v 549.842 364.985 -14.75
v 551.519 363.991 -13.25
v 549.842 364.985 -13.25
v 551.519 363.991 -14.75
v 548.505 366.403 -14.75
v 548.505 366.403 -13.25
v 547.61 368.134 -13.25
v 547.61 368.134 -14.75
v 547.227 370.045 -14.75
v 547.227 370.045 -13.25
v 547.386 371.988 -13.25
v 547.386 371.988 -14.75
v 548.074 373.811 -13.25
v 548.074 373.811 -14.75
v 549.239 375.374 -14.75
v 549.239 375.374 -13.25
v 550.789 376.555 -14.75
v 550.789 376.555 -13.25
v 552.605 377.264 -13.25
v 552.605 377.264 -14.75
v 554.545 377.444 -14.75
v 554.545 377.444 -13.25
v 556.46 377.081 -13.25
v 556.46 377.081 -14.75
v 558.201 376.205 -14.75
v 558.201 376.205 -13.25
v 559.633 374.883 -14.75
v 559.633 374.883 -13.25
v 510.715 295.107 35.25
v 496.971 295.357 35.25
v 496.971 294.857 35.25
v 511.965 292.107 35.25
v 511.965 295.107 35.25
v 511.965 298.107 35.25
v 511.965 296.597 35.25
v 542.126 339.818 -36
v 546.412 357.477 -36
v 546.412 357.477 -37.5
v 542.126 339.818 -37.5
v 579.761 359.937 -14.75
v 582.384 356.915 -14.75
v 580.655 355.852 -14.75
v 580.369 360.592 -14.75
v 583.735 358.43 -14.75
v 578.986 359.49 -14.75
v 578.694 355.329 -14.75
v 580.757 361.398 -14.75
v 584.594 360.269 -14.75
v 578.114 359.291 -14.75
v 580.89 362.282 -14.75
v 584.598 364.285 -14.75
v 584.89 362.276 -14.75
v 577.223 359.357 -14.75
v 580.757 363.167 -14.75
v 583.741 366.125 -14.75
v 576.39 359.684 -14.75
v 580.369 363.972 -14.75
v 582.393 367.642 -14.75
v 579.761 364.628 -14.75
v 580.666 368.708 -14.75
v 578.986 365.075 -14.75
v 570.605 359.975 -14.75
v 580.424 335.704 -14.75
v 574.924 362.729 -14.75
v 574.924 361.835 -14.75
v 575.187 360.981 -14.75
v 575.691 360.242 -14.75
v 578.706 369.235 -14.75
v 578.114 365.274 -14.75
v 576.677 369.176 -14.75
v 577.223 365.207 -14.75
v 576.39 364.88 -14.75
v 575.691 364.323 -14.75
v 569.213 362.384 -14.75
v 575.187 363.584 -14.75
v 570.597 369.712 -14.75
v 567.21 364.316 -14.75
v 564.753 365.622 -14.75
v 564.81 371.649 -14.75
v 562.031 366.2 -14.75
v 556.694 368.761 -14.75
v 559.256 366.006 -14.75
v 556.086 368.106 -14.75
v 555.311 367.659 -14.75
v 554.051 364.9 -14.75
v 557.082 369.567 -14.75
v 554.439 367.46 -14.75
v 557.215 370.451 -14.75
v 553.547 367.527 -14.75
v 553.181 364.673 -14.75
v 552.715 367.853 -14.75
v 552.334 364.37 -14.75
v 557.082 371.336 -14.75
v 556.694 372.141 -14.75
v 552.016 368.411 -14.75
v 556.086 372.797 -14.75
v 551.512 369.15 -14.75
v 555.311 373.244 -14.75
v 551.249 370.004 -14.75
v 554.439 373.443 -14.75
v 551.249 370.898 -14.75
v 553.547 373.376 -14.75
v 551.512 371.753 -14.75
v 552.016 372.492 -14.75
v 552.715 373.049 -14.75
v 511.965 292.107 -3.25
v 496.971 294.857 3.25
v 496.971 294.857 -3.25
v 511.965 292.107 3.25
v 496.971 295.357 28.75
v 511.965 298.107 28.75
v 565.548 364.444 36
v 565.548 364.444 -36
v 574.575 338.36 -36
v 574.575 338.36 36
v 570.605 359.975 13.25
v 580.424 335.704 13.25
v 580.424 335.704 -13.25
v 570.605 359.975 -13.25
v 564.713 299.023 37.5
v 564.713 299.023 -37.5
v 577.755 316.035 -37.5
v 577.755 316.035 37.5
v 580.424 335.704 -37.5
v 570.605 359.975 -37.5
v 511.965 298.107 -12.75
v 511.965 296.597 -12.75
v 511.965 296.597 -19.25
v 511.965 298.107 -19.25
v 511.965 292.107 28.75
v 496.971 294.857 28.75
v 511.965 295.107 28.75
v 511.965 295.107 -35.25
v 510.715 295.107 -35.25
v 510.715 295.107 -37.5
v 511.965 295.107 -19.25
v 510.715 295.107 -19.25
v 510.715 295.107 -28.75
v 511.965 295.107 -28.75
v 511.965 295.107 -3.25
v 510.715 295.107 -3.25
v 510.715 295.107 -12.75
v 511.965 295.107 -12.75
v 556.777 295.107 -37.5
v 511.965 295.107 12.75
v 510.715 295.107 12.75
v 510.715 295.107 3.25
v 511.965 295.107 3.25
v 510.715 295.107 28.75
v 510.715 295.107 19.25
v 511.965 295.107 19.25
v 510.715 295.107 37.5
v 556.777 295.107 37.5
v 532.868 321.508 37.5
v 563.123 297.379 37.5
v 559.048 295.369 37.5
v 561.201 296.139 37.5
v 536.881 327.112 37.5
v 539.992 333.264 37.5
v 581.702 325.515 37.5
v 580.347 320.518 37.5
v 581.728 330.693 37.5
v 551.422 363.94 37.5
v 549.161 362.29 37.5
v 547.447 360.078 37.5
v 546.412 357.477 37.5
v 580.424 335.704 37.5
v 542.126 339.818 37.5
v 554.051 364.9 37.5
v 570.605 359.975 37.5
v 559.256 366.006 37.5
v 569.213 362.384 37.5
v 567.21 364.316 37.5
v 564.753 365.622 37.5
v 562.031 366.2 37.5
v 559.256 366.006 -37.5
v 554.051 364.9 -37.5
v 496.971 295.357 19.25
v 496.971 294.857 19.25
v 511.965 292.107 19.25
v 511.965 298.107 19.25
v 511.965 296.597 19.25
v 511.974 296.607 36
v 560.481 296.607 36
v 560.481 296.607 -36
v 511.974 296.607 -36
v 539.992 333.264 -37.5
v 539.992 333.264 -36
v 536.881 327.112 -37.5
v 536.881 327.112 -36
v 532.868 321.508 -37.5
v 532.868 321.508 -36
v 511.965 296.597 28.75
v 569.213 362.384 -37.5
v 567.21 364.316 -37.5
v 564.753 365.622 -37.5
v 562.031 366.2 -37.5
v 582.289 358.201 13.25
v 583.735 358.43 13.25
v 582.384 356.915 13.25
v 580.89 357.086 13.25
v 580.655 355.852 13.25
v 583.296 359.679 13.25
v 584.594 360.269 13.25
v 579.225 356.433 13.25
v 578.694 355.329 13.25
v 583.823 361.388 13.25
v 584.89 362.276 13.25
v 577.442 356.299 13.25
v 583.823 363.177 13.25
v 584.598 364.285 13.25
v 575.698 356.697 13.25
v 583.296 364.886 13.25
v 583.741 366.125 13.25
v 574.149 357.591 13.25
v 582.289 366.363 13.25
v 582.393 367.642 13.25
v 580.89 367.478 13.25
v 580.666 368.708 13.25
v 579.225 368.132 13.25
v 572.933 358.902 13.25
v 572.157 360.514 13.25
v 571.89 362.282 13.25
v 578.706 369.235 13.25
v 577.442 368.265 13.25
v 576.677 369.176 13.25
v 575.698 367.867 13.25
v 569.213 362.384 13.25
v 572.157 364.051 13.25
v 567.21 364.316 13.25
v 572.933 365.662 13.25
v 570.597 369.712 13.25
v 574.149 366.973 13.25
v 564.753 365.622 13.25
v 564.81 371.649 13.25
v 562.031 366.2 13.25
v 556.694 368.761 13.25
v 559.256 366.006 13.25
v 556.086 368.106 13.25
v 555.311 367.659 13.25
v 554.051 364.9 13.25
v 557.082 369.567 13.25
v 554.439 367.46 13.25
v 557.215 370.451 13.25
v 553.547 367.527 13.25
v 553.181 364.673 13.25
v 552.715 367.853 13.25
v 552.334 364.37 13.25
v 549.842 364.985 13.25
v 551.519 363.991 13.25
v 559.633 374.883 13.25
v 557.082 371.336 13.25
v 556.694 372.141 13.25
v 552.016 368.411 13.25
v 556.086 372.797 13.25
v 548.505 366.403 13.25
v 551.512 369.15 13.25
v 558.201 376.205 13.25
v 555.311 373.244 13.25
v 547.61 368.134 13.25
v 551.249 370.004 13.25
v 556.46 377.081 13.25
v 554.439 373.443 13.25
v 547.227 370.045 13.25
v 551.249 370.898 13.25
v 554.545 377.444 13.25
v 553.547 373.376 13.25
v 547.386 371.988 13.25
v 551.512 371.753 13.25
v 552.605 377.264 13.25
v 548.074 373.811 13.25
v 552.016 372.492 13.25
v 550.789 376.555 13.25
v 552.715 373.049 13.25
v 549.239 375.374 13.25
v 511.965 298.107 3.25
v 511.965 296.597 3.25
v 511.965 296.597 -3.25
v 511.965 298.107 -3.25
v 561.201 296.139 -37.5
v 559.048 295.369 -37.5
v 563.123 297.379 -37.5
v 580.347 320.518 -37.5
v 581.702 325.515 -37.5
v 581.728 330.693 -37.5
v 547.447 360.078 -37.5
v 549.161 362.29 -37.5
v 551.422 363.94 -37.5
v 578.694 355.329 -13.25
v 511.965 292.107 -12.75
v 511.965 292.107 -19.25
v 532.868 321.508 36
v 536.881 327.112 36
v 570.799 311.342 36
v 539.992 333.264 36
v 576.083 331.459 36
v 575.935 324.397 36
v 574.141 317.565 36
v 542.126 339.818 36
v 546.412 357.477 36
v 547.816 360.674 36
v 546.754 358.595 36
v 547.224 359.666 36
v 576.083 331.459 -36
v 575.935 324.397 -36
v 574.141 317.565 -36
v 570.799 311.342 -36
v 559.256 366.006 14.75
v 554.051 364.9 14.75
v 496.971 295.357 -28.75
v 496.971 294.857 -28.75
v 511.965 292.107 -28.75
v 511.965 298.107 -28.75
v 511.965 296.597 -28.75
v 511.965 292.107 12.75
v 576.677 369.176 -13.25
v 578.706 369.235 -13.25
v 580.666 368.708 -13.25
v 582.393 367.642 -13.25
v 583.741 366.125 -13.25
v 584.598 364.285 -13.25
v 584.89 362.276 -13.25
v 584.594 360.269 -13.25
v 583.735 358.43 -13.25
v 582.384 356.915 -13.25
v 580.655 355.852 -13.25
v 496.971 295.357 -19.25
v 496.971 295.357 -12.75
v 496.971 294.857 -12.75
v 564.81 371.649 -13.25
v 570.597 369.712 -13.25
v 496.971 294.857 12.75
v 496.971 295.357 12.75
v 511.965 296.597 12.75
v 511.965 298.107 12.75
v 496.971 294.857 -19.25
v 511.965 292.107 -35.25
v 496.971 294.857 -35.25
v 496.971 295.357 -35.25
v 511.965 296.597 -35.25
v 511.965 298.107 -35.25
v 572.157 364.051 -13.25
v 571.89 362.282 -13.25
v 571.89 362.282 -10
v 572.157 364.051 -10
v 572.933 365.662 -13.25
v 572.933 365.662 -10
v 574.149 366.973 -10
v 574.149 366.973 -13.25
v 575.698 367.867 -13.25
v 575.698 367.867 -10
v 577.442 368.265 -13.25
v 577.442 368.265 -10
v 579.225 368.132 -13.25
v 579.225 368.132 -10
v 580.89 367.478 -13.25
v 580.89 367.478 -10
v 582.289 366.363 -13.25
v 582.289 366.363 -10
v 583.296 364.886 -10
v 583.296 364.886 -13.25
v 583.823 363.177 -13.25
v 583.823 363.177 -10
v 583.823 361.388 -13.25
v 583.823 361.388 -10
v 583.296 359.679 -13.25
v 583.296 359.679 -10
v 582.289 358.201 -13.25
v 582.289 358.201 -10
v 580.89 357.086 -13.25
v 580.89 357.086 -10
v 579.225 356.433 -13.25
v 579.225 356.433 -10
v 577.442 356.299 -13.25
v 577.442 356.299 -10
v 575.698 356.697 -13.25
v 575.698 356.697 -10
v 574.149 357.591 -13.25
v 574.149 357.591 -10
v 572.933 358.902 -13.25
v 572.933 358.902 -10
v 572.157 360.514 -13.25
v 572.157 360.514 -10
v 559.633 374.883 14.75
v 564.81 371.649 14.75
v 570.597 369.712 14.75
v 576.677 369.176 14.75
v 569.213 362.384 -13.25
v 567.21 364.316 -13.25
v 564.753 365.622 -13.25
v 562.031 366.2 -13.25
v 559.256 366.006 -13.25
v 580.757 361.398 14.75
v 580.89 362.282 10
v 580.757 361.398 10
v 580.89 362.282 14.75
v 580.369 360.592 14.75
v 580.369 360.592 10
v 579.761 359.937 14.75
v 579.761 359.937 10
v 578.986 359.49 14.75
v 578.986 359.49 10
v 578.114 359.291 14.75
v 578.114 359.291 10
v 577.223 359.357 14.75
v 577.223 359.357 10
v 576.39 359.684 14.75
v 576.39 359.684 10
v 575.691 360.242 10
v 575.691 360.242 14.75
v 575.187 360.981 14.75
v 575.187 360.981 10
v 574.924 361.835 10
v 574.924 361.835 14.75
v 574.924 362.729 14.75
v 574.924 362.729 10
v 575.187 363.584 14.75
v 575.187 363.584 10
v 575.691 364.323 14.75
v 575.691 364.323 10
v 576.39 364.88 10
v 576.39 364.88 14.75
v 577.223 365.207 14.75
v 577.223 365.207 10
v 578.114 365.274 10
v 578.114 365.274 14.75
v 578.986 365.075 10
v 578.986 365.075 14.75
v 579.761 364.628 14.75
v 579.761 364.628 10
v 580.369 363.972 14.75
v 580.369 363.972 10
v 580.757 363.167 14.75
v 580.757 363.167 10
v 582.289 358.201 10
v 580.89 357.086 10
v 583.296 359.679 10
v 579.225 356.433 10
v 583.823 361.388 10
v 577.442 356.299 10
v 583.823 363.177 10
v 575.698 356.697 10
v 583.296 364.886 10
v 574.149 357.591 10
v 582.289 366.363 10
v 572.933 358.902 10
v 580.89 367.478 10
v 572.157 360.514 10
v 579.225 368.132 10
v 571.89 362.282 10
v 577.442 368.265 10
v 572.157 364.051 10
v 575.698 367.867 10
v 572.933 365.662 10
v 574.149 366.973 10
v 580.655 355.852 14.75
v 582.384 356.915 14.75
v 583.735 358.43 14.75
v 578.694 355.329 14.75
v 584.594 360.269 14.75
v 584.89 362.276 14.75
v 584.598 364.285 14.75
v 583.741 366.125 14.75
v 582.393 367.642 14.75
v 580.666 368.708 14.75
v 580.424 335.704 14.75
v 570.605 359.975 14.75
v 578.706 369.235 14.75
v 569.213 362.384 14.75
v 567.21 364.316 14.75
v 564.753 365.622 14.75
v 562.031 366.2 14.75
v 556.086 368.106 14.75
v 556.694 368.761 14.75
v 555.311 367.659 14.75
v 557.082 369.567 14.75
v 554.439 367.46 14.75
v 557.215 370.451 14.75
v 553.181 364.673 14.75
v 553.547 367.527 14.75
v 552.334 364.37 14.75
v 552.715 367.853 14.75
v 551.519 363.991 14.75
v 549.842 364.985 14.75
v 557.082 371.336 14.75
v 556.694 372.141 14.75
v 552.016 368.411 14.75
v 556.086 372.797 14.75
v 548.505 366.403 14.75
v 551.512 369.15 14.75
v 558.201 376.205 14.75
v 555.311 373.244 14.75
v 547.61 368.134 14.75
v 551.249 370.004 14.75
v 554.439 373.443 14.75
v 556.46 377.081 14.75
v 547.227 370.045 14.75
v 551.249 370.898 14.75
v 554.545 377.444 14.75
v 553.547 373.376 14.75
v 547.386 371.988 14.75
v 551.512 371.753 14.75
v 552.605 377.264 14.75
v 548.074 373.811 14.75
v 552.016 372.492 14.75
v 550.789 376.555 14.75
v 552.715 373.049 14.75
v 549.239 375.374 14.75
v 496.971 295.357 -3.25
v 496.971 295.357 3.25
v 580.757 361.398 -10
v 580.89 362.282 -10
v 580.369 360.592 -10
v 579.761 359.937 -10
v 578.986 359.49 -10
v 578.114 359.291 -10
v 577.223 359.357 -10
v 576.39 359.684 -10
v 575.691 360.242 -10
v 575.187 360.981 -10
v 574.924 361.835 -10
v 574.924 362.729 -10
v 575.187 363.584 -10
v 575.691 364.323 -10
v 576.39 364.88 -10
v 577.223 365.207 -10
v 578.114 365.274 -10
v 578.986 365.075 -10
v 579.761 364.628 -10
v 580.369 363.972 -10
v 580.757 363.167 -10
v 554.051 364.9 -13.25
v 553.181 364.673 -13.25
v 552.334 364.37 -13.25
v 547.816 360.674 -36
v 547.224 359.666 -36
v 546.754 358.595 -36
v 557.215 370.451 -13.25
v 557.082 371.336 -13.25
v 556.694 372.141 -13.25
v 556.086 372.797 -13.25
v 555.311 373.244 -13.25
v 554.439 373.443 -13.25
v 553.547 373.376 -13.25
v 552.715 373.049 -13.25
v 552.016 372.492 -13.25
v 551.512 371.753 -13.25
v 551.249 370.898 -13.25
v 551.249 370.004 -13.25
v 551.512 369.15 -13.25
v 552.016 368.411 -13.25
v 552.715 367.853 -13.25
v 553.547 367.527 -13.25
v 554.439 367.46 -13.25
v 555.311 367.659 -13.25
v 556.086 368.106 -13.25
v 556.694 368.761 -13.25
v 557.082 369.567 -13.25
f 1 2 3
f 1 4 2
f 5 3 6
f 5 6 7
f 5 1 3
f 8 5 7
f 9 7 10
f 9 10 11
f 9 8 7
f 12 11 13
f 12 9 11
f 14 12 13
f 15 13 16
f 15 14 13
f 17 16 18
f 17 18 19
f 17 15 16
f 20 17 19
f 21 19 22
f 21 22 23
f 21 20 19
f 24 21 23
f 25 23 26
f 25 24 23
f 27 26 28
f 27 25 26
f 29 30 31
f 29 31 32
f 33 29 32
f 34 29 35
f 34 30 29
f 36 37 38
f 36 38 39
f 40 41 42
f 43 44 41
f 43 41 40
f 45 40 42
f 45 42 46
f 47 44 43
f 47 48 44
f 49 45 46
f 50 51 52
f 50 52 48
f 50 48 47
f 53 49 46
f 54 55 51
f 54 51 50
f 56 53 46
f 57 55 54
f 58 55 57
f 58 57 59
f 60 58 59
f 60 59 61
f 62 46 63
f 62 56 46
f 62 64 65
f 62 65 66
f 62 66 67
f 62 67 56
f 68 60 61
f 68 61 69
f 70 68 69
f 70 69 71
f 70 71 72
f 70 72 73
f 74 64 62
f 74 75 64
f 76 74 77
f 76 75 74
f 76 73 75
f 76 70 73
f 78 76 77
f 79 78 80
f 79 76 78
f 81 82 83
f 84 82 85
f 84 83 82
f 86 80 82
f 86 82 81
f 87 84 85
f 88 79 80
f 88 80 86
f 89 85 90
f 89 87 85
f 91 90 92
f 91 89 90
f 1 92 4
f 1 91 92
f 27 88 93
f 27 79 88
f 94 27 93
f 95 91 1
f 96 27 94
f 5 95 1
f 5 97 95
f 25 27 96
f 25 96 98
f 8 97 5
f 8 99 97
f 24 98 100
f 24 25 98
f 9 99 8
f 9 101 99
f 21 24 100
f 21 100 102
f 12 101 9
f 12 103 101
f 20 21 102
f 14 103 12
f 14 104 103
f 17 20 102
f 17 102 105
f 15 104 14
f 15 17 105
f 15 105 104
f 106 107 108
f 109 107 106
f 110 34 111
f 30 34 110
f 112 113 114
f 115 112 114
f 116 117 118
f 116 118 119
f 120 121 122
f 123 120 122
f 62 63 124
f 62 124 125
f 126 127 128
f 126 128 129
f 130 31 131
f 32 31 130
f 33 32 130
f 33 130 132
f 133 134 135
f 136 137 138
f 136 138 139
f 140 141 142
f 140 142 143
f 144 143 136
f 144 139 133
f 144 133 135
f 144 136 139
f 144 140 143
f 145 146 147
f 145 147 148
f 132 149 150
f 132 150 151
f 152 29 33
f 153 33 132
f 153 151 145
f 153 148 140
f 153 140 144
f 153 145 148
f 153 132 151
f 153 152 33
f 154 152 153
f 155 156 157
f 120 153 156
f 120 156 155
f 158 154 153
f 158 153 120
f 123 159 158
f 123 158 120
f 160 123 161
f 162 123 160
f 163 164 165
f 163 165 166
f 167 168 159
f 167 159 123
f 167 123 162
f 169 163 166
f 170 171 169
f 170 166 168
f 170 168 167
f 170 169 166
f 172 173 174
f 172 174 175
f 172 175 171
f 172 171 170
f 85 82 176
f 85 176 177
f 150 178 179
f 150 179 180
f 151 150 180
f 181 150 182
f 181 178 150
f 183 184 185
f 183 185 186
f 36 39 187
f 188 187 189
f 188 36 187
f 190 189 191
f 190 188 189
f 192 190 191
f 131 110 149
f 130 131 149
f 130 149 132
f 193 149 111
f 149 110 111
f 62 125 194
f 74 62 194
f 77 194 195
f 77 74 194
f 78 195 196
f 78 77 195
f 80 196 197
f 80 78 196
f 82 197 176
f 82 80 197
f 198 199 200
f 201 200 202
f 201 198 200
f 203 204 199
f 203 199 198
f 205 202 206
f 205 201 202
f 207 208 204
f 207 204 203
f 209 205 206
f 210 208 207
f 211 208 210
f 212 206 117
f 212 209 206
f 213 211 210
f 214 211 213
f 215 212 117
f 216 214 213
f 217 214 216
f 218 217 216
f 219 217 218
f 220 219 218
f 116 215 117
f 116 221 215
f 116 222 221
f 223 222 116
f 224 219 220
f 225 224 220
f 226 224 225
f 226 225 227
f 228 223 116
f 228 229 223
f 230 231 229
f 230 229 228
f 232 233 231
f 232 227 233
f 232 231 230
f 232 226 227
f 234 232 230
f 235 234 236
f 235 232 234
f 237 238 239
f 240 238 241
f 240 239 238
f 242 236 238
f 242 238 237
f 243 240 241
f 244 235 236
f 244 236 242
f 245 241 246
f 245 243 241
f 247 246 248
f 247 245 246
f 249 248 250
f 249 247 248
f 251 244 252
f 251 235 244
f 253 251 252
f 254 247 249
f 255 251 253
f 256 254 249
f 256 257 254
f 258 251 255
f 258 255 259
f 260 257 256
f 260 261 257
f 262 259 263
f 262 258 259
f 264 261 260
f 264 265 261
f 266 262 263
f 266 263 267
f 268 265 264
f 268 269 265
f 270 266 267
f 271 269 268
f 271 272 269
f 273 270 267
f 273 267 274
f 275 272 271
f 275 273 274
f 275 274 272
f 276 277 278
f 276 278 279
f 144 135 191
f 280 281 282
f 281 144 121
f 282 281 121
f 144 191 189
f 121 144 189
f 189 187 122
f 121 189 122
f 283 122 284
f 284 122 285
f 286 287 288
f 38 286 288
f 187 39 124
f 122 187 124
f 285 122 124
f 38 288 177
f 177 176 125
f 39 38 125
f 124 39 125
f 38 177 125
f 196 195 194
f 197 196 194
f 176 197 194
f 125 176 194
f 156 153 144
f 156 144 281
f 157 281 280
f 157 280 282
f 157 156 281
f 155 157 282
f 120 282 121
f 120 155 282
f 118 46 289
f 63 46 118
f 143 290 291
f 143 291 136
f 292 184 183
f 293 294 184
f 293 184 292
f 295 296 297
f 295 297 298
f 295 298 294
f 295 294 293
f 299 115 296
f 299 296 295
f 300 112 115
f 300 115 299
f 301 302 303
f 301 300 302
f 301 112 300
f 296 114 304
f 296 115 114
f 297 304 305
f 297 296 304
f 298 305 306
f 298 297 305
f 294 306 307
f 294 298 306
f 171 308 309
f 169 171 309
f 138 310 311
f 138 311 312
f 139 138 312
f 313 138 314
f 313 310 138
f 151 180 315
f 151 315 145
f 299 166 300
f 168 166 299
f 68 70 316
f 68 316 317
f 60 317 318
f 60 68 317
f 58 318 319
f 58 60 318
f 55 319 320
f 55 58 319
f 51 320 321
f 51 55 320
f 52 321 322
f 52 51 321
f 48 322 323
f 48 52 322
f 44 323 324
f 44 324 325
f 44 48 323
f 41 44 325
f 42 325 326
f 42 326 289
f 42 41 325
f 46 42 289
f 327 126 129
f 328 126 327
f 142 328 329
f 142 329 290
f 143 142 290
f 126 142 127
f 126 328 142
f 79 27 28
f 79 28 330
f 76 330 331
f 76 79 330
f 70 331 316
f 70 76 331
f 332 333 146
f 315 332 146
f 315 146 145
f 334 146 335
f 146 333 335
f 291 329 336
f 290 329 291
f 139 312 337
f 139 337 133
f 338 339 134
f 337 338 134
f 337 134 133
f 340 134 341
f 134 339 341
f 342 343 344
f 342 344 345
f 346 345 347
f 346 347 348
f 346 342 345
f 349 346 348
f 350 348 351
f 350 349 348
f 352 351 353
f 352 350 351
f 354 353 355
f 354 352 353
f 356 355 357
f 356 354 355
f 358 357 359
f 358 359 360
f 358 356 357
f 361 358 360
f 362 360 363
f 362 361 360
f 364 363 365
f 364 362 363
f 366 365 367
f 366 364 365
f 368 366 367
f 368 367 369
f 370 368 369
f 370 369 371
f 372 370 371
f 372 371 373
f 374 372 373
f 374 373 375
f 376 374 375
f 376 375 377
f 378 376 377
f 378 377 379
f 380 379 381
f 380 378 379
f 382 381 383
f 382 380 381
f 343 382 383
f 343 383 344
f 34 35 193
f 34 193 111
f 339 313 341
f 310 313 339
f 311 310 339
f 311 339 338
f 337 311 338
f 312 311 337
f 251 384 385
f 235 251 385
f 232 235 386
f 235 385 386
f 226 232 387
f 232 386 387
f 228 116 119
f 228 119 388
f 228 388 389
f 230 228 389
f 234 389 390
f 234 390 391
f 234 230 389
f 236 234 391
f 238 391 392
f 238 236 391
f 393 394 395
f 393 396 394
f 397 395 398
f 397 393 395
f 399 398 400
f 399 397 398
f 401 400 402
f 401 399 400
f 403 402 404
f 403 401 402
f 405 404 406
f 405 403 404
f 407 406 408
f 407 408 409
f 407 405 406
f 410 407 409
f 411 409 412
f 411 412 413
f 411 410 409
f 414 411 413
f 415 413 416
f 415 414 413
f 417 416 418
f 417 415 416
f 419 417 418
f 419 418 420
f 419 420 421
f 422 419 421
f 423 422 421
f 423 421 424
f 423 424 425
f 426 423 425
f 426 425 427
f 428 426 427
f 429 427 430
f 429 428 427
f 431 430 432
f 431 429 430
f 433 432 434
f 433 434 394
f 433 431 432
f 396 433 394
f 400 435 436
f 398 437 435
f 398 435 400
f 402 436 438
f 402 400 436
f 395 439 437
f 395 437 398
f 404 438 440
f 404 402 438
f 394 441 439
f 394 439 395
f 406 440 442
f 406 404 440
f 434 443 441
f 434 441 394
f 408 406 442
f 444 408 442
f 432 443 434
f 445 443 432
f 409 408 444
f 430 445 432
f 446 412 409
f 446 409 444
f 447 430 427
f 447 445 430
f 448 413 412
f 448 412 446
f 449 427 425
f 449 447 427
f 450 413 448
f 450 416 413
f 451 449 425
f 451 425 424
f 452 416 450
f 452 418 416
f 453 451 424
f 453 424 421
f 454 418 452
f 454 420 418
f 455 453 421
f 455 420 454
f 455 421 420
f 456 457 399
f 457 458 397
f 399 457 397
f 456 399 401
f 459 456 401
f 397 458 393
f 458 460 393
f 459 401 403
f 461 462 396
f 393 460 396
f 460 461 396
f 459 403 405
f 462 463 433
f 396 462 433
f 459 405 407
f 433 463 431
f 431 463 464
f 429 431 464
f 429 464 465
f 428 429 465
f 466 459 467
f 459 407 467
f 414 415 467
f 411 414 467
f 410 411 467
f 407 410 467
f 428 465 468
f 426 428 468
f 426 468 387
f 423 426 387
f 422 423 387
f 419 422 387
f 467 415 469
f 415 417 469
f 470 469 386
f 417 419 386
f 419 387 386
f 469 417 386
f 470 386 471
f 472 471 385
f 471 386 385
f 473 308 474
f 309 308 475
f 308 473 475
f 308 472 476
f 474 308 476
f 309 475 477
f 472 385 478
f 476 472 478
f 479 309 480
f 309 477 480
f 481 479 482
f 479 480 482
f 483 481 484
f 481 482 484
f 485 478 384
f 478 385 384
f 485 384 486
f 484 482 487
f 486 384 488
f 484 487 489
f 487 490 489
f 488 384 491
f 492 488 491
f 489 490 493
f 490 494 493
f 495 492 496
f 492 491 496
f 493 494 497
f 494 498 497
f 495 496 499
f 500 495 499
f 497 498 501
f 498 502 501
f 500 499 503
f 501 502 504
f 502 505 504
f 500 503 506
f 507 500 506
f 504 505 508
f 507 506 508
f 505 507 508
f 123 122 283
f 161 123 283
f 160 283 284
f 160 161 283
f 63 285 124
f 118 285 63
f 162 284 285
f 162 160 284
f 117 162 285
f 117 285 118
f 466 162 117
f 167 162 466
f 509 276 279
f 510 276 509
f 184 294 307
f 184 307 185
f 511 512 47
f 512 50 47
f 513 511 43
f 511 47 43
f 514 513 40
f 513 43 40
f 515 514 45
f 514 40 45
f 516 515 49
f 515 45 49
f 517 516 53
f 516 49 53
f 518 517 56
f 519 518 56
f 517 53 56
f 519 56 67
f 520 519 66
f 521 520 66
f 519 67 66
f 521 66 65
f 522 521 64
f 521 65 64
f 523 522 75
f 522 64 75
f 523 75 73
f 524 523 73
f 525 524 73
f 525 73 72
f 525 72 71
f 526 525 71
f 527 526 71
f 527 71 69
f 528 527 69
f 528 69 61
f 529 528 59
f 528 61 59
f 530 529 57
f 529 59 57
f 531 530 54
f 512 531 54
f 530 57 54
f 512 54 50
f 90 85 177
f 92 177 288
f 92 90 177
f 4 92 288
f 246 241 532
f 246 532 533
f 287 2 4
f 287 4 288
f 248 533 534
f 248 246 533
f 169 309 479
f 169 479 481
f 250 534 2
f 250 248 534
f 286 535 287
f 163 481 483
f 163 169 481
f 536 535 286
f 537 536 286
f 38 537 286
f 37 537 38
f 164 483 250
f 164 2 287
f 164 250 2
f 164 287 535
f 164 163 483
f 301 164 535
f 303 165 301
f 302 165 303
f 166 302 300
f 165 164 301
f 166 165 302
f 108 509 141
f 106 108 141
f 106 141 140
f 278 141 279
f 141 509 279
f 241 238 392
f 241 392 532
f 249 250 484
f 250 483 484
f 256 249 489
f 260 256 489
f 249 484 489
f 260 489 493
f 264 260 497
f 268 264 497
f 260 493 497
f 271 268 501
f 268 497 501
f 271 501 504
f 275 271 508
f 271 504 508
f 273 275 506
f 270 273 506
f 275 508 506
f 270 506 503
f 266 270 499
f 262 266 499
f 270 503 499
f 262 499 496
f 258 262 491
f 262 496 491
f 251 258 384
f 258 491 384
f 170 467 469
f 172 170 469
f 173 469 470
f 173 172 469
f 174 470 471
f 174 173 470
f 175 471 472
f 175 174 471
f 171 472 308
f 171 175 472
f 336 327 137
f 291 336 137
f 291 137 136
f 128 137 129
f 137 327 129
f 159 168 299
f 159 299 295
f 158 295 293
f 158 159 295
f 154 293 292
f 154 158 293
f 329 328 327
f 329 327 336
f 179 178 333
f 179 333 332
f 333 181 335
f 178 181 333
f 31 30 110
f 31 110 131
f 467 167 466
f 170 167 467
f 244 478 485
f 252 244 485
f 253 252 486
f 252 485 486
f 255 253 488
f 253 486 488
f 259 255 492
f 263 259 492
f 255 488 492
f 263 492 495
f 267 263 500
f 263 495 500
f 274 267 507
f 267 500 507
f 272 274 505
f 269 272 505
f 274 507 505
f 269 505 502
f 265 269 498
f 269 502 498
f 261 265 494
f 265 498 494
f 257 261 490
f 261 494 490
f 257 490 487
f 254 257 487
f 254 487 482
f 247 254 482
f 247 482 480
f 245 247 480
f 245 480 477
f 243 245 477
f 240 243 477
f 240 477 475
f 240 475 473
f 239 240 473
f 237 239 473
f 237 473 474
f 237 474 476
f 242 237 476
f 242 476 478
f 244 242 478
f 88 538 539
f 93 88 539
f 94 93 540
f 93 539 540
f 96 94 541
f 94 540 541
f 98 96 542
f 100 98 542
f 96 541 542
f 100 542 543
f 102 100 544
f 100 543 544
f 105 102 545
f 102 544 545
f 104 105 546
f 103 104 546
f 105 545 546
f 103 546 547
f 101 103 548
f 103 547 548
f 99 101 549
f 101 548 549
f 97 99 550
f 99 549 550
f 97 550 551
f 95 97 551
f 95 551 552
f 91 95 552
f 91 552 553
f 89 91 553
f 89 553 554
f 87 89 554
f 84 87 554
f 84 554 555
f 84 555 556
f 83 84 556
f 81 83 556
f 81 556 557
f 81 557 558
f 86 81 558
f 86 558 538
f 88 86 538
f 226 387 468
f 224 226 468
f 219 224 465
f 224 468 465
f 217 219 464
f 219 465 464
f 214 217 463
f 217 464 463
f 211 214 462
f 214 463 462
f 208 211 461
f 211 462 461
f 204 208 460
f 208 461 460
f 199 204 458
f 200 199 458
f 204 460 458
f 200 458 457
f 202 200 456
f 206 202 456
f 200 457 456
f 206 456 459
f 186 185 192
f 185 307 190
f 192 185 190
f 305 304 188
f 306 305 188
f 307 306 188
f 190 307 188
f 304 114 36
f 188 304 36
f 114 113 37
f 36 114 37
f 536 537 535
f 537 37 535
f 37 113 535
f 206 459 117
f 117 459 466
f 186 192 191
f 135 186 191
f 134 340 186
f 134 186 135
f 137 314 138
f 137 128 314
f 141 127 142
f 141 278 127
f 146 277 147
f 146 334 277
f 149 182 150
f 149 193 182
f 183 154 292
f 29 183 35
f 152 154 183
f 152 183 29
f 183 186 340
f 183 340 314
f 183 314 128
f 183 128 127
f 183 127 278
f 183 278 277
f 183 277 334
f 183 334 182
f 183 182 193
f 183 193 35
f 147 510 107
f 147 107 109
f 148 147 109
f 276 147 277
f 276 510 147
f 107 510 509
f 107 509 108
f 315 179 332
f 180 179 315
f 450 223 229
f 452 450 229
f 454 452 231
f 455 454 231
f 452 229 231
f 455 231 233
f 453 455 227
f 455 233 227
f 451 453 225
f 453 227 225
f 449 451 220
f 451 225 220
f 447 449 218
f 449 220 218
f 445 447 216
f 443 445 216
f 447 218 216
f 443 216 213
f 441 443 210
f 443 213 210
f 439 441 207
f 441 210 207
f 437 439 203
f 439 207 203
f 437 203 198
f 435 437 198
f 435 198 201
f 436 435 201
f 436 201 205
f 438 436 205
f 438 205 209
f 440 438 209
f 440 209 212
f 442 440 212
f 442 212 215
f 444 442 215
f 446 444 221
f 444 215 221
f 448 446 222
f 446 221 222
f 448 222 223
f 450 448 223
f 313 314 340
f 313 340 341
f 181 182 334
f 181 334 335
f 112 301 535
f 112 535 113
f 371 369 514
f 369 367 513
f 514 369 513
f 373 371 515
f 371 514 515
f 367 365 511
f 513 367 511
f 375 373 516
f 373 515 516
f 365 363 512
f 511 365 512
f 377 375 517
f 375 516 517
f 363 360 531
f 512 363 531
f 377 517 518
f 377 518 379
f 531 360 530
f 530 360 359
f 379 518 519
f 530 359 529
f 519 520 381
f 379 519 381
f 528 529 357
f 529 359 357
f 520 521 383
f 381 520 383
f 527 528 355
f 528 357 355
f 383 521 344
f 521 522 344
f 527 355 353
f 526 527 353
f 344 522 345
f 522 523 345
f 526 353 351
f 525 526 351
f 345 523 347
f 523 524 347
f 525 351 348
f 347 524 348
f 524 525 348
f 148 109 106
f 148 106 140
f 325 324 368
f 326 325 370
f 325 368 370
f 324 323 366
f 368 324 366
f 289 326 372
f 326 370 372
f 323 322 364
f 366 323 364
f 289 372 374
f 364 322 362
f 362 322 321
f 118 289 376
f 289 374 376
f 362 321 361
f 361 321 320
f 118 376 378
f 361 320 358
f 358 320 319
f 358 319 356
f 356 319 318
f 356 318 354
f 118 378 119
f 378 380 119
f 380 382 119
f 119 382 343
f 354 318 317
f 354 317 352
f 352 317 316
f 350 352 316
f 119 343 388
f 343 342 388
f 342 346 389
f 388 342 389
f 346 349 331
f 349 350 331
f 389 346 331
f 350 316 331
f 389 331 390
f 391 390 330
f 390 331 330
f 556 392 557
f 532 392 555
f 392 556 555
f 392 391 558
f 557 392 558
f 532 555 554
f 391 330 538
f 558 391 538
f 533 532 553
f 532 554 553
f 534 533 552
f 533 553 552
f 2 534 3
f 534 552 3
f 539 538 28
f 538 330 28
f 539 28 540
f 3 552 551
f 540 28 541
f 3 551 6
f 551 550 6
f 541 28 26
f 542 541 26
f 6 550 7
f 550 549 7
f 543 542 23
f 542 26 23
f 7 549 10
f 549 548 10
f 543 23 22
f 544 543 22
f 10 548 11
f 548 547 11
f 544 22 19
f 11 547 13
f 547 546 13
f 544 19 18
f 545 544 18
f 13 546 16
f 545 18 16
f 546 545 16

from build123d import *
from build123d.topology import SkipClean

# Parameters (mm, degrees)
BOSS_EXTRUDE4_DEPTH  = 375
BOSS_EXTRUDE5_DEPTH  = 7.5
CUT_EXTRUDE1_DEPTH   = 360
BOSS_EXTRUDE6_DEPTH  = 32.5
LPATTERN1_COUNT      = 3
LPATTERN1_PITCH      = 160
LPATTERN1_COUNT_DIR2 = 3
LPATTERN1_PITCH_DIR2 = 160
SKETCH11_R           = 30
CUT_EXTRUDE2_DEPTH   = 1263.512529339
SKETCH12_R           = 60
SKETCH12_R_2         = 30
BOSS_EXTRUDE7_DEPTH  = 32.5
SCALE_1_SCALE        = 0.1


with BuildPart() as part:
    # Sketch1 → Boss-Extrude4 (new, symmetric)
    with BuildSketch(Plane.XY):
        with BuildLine():
            Line((281.569977344, 264.00526259), (60.043258876, 0))
            Line((60.043258876, 0), (520.65961219, 0))
            ThreePointArc((520.65961219, 0), (564.907123778, 10.321921752), (600.02024832, 39.156845634))
            Line((600.02024832, 39.156845634), (730.44724808, 209.279019234))
            ThreePointArc((730.44724808, 209.279019234), (769.910899903, 304.081580706), (757.128519442, 405.97130652))
            Line((757.128519442, 405.97130652), (658.940406775, 648.676304078))
            ThreePointArc((658.940406775, 648.676304078), (613.16613298, 699.478789474), (545.447965883, 708.988074874))
            Line((545.447965883, 708.988074874), (493.401915404, 697.925345336))
            ThreePointArc((493.401915404, 697.925345336), (444.503904969, 671.828213907), (417.014937982, 623.698884104))
            Line((417.014937982, 623.698884104), (374.151637205, 447.112342165))
            ThreePointArc((374.151637205, 447.112342165), (338.436231819, 350.211710608), (281.569977344, 264.00526259))
        make_face()
    extrude(amount=BOSS_EXTRUDE4_DEPTH, both=True)

    # Sketch6 → Boss-Extrude5 (add, symmetric)
    with BuildSketch(Plane.XY.offset(140)):
        with BuildLine():
            Line((739.837232288, 602.21499348), (757.128519442, 405.97130652))
            Line((757.128519442, 405.97130652), (468.079651675, 688.843619215))
            ThreePointArc((468.079651675, 688.843619215), (438.909700759, 795.263431413), (549.226629435, 797.76097261))
            ThreePointArc((549.226629435, 797.76097261), (629.357941615, 754.030269249), (719.665800913, 740.692647386))
            ThreePointArc((719.665800913, 740.692647386), (801.063667795, 681.841548153), (739.837232288, 602.21499348))
        make_face()
    boss_extrude5 = extrude(amount=BOSS_EXTRUDE5_DEPTH, both=True)

    # Mirror2: Boss-Extrude5 across plane
    add(boss_extrude5.mirror(Plane.XY))

    # Sketch7 → Cut-Extrude1 (cut, symmetric)
    with BuildSketch(Plane.XY):
        with BuildLine():
            Line((60.410578327, 15), (329.990480538, 400))
            Line((329.990480538, 400), (404.359842809, 650))
            Line((404.359842809, 650), (608.375948196, 693.364961886))
            Line((608.375948196, 693.364961886), (698.639094975, 432.530508414))
            ThreePointArc((698.639094975, 432.530508414), (712.247197771, 292.899677108), (660.880251772, 162.349355884))
            Line((660.880251772, 162.349355884), (557.705122032, 15))
            Line((557.705122032, 15), (60.410578327, 15))
        make_face()
    extrude(amount=CUT_EXTRUDE1_DEPTH, both=True, mode=Mode.SUBTRACT)

    # Sketch10 → Boss-Extrude6 (add, symmetric)
    with BuildSketch(Plane.XY):
        Polygon((72.542939803, 30), (-77.392739815, 2.5), (-77.392739815, -2.5), (72.542939803, -30), (72.542939803, 0), align=None)
    boss_extrude6 = extrude(amount=BOSS_EXTRUDE6_DEPTH, both=True)

    # LPattern1: Boss-Extrude6 3 × 3
    with Locations(*[Vector(0, 0, 1) * (i * LPATTERN1_PITCH) + Vector(0, 0, -1) * (j * LPATTERN1_PITCH_DIR2) for i in range(LPATTERN1_COUNT) for j in range(LPATTERN1_COUNT_DIR2) if (i, j) != (0, 0)]):
        add(boss_extrude6)

    # Sketch11 → Cut-Extrude2 (cut, through all)
    with BuildSketch(Plane.XY.offset(147.5)):
        with Locations((495.043258876, 753.442101292)):
            Circle(SKETCH11_R)
        with Locations((731.794701004, 671.751442127)):
            Circle(SKETCH11_R)
    extrude(amount=-CUT_EXTRUDE2_DEPTH, mode=Mode.SUBTRACT)

    # Sketch12 → Boss-Extrude7 (add)
    with SkipClean():  # the faces are left unmerged after this step: merging them gives an invalid solid
        with BuildSketch(Plane(origin=(0, 0, 132.5), x_dir=(-1, 0, 0), z_dir=(0, 0, -1))):
            with Locations((-731.794701004, 671.751442127)):
                Circle(SKETCH12_R)
            with Locations((-731.794701004, 671.751442127)):
                Circle(SKETCH12_R_2, mode=Mode.SUBTRACT)
        boss_extrude7 = extrude(amount=BOSS_EXTRUDE7_DEPTH)

    # Mirror3: Boss-Extrude7 across plane
    add(boss_extrude7.mirror(Plane.XY))


with BuildPart() as part_1:
    # 缩放比例1: scaled about (560.789704791, 327.896781874, 0)
    add(part.part.scale(SCALE_1_SCALE).moved(Location((504.710734312, 295.107103687, 0))))


solid = part_1.part
